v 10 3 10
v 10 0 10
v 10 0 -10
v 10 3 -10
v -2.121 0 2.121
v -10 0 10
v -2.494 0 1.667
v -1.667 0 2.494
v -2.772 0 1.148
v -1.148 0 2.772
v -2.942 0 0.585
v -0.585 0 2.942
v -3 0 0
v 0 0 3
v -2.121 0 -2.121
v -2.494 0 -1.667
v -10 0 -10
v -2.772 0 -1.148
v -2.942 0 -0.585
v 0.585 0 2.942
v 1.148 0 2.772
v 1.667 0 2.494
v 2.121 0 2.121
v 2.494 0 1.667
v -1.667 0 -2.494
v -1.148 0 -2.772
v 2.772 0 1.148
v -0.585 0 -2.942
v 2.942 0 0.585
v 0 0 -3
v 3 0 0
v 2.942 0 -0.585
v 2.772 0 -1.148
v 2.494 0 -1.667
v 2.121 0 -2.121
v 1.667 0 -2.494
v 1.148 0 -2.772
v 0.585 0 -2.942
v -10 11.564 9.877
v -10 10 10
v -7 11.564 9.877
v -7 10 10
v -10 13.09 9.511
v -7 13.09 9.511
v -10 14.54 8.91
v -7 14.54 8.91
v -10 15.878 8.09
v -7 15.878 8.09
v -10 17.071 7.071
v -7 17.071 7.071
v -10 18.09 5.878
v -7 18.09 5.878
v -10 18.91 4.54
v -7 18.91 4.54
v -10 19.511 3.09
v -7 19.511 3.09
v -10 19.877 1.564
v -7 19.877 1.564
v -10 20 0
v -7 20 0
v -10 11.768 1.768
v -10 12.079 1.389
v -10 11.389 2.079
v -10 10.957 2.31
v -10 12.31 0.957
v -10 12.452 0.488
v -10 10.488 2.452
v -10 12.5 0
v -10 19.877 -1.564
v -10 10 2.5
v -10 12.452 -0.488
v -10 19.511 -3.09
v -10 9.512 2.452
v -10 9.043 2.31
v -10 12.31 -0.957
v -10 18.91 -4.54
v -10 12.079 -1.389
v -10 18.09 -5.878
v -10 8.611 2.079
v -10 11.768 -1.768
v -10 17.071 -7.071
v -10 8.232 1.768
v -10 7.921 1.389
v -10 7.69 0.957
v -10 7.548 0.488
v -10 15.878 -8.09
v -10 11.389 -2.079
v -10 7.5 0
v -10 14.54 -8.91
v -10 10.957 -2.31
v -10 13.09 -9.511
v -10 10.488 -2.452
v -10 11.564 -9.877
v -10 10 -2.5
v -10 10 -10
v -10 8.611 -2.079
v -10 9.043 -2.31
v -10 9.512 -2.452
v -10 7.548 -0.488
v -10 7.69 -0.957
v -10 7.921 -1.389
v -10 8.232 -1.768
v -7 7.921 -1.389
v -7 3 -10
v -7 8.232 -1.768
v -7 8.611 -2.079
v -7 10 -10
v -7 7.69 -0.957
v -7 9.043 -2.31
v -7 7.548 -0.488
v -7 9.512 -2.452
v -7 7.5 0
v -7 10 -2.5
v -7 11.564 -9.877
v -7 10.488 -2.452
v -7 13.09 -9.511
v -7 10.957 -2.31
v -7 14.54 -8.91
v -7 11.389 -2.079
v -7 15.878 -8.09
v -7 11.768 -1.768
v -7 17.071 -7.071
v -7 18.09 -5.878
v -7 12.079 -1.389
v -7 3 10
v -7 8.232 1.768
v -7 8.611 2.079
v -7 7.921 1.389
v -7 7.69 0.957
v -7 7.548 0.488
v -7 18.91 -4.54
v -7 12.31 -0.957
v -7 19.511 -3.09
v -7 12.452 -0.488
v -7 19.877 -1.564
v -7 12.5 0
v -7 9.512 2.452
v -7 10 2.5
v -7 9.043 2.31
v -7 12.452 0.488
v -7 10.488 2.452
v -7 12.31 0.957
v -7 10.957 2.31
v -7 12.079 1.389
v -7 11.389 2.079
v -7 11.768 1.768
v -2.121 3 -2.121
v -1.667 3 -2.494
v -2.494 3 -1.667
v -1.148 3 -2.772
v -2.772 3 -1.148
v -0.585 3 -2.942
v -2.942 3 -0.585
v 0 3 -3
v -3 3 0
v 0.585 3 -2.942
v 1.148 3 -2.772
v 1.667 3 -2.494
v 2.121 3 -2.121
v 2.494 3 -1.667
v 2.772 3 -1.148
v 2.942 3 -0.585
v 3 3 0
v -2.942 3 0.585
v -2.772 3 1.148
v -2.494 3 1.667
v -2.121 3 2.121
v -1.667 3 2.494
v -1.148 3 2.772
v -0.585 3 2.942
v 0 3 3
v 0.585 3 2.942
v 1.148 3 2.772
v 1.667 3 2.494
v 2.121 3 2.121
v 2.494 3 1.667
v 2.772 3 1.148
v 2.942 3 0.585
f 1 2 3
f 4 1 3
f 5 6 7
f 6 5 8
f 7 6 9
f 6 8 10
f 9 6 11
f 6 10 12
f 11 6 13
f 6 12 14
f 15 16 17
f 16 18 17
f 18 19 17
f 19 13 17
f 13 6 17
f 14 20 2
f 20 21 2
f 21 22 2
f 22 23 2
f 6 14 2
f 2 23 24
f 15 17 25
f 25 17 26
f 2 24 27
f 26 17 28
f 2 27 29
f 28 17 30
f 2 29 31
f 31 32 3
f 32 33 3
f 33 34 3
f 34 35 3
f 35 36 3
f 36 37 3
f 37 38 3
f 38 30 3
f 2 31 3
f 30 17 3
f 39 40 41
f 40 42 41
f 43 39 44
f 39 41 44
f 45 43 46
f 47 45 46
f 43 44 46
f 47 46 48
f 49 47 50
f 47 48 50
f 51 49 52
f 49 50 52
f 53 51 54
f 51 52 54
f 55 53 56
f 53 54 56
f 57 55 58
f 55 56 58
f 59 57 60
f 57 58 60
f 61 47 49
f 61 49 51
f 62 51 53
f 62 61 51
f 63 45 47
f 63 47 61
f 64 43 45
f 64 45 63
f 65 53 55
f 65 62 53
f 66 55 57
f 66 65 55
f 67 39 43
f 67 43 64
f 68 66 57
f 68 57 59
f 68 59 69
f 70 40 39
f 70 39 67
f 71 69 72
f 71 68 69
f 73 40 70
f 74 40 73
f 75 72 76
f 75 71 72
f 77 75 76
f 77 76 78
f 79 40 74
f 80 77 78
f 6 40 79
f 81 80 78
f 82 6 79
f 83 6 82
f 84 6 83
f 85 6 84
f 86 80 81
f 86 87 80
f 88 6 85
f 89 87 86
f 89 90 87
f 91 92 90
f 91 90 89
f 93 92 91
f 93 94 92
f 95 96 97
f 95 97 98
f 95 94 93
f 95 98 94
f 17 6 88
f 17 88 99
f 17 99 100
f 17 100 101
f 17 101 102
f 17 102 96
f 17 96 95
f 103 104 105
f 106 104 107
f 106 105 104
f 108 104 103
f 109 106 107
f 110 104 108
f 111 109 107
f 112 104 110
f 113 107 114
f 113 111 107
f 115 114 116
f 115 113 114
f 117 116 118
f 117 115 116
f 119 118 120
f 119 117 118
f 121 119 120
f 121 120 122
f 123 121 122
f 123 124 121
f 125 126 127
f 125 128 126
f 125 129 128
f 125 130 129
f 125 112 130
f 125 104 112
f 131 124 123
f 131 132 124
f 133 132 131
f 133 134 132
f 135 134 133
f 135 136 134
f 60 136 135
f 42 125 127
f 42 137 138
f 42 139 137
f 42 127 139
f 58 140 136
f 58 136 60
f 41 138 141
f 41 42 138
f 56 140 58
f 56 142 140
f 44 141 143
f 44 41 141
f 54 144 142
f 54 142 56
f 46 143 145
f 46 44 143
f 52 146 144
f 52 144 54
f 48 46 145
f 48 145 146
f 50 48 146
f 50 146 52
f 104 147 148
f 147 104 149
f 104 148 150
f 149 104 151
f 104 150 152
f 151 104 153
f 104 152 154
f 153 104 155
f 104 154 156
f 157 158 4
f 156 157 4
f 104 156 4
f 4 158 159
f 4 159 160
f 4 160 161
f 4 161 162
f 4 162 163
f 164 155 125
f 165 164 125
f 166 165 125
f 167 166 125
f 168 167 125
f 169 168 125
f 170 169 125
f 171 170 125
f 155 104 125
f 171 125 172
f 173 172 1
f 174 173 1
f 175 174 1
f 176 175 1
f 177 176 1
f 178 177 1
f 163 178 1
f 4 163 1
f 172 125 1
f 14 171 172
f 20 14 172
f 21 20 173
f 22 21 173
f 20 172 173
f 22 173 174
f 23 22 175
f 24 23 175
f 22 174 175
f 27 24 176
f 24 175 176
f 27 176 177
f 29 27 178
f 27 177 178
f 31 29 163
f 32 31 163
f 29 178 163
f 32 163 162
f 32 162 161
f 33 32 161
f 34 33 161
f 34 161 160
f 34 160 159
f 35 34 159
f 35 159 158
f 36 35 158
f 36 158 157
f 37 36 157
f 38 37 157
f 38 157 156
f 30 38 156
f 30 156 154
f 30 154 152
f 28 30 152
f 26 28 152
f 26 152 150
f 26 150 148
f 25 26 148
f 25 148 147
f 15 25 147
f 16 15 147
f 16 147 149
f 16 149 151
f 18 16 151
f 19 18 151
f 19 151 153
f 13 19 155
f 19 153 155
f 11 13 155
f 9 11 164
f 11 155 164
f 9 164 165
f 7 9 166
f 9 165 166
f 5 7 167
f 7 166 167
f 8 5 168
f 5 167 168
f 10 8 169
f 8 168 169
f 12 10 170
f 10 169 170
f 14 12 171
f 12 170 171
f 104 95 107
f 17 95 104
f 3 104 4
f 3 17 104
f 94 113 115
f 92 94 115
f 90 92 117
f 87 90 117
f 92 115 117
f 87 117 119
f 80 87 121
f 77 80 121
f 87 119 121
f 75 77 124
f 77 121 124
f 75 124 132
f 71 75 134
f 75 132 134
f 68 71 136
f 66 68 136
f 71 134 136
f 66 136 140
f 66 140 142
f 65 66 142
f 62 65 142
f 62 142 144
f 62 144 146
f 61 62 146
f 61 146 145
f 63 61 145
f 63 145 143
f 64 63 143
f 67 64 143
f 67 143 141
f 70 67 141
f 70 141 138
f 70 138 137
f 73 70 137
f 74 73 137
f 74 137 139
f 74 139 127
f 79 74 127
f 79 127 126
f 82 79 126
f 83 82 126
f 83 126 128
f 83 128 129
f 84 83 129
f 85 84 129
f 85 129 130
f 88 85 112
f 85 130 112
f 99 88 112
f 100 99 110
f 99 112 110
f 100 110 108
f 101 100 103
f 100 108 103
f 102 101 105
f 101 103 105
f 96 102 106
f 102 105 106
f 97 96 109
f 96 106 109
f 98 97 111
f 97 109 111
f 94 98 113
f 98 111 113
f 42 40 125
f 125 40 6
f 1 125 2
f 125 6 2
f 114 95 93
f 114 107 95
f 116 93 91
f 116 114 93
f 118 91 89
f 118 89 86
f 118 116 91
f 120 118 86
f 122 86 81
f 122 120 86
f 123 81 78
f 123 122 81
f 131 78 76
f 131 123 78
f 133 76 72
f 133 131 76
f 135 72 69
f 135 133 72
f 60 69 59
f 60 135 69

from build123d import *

# Parameters (mm, degrees)
SKETCH_1_W          = 20
SKETCH_1_H          = 20
EXTRUDE_1_DEPTH     = 20
SKETCH_2_W          = 17
SKETCH_2_H          = 17
CUT_EXTRUDE_1_DEPTH = 20
FILLET_1_R          = 10
SKETCH_3_R          = 2.5
CUT_EXTRUDE_2_DEPTH = 20
SKETCH_4_R          = 3
CUT_EXTRUDE_3_DEPTH = 20


with BuildPart() as part:
    # 草图1 → 凸台-拉伸1 (new body)
    with BuildSketch(Plane(origin=(0, 0, 0), x_dir=(1, 0, 0), z_dir=(0, 1, 0))):
        Rectangle(SKETCH_1_W, SKETCH_1_H)
    extrude(amount=EXTRUDE_1_DEPTH)

    # 草图2 → 切除-拉伸1 (cut)
    with BuildSketch(Plane.XY.offset(10)):
        with Locations((1.5, 11.5)):
            Rectangle(SKETCH_2_W, SKETCH_2_H)
    extrude(amount=-CUT_EXTRUDE_1_DEPTH, mode=Mode.SUBTRACT)

    # 圆角1
    fillet_1_edges = [part.edges().sort_by_distance(p)[0] for p in [
        (-8.5, 20, -10),
        (-8.5, 20, 10),
    ]]
    fillet(fillet_1_edges, radius=FILLET_1_R - 0.0001)  # a hair under: the kernel refuses the full size

    # 草图3 → 切除-拉伸2 (cut)
    with BuildSketch(Plane(origin=(-7, 0, 0), x_dir=(0, 0, -1), z_dir=(1, 0, 0))):
        with Locations((0, 10)):
            Circle(SKETCH_3_R)
    extrude(amount=-CUT_EXTRUDE_2_DEPTH, mode=Mode.SUBTRACT)

    # 草图4 → 切除-拉伸3 (cut)
    with BuildSketch(Plane(origin=(0, 3, 0), x_dir=(1, 0, 0), z_dir=(0, 1, 0))):
        with Locations(Location((0, 0, 0), (0, 0, 270))):
            Circle(SKETCH_4_R)
    extrude(amount=-CUT_EXTRUDE_3_DEPTH, mode=Mode.SUBTRACT)


solid = part.part
